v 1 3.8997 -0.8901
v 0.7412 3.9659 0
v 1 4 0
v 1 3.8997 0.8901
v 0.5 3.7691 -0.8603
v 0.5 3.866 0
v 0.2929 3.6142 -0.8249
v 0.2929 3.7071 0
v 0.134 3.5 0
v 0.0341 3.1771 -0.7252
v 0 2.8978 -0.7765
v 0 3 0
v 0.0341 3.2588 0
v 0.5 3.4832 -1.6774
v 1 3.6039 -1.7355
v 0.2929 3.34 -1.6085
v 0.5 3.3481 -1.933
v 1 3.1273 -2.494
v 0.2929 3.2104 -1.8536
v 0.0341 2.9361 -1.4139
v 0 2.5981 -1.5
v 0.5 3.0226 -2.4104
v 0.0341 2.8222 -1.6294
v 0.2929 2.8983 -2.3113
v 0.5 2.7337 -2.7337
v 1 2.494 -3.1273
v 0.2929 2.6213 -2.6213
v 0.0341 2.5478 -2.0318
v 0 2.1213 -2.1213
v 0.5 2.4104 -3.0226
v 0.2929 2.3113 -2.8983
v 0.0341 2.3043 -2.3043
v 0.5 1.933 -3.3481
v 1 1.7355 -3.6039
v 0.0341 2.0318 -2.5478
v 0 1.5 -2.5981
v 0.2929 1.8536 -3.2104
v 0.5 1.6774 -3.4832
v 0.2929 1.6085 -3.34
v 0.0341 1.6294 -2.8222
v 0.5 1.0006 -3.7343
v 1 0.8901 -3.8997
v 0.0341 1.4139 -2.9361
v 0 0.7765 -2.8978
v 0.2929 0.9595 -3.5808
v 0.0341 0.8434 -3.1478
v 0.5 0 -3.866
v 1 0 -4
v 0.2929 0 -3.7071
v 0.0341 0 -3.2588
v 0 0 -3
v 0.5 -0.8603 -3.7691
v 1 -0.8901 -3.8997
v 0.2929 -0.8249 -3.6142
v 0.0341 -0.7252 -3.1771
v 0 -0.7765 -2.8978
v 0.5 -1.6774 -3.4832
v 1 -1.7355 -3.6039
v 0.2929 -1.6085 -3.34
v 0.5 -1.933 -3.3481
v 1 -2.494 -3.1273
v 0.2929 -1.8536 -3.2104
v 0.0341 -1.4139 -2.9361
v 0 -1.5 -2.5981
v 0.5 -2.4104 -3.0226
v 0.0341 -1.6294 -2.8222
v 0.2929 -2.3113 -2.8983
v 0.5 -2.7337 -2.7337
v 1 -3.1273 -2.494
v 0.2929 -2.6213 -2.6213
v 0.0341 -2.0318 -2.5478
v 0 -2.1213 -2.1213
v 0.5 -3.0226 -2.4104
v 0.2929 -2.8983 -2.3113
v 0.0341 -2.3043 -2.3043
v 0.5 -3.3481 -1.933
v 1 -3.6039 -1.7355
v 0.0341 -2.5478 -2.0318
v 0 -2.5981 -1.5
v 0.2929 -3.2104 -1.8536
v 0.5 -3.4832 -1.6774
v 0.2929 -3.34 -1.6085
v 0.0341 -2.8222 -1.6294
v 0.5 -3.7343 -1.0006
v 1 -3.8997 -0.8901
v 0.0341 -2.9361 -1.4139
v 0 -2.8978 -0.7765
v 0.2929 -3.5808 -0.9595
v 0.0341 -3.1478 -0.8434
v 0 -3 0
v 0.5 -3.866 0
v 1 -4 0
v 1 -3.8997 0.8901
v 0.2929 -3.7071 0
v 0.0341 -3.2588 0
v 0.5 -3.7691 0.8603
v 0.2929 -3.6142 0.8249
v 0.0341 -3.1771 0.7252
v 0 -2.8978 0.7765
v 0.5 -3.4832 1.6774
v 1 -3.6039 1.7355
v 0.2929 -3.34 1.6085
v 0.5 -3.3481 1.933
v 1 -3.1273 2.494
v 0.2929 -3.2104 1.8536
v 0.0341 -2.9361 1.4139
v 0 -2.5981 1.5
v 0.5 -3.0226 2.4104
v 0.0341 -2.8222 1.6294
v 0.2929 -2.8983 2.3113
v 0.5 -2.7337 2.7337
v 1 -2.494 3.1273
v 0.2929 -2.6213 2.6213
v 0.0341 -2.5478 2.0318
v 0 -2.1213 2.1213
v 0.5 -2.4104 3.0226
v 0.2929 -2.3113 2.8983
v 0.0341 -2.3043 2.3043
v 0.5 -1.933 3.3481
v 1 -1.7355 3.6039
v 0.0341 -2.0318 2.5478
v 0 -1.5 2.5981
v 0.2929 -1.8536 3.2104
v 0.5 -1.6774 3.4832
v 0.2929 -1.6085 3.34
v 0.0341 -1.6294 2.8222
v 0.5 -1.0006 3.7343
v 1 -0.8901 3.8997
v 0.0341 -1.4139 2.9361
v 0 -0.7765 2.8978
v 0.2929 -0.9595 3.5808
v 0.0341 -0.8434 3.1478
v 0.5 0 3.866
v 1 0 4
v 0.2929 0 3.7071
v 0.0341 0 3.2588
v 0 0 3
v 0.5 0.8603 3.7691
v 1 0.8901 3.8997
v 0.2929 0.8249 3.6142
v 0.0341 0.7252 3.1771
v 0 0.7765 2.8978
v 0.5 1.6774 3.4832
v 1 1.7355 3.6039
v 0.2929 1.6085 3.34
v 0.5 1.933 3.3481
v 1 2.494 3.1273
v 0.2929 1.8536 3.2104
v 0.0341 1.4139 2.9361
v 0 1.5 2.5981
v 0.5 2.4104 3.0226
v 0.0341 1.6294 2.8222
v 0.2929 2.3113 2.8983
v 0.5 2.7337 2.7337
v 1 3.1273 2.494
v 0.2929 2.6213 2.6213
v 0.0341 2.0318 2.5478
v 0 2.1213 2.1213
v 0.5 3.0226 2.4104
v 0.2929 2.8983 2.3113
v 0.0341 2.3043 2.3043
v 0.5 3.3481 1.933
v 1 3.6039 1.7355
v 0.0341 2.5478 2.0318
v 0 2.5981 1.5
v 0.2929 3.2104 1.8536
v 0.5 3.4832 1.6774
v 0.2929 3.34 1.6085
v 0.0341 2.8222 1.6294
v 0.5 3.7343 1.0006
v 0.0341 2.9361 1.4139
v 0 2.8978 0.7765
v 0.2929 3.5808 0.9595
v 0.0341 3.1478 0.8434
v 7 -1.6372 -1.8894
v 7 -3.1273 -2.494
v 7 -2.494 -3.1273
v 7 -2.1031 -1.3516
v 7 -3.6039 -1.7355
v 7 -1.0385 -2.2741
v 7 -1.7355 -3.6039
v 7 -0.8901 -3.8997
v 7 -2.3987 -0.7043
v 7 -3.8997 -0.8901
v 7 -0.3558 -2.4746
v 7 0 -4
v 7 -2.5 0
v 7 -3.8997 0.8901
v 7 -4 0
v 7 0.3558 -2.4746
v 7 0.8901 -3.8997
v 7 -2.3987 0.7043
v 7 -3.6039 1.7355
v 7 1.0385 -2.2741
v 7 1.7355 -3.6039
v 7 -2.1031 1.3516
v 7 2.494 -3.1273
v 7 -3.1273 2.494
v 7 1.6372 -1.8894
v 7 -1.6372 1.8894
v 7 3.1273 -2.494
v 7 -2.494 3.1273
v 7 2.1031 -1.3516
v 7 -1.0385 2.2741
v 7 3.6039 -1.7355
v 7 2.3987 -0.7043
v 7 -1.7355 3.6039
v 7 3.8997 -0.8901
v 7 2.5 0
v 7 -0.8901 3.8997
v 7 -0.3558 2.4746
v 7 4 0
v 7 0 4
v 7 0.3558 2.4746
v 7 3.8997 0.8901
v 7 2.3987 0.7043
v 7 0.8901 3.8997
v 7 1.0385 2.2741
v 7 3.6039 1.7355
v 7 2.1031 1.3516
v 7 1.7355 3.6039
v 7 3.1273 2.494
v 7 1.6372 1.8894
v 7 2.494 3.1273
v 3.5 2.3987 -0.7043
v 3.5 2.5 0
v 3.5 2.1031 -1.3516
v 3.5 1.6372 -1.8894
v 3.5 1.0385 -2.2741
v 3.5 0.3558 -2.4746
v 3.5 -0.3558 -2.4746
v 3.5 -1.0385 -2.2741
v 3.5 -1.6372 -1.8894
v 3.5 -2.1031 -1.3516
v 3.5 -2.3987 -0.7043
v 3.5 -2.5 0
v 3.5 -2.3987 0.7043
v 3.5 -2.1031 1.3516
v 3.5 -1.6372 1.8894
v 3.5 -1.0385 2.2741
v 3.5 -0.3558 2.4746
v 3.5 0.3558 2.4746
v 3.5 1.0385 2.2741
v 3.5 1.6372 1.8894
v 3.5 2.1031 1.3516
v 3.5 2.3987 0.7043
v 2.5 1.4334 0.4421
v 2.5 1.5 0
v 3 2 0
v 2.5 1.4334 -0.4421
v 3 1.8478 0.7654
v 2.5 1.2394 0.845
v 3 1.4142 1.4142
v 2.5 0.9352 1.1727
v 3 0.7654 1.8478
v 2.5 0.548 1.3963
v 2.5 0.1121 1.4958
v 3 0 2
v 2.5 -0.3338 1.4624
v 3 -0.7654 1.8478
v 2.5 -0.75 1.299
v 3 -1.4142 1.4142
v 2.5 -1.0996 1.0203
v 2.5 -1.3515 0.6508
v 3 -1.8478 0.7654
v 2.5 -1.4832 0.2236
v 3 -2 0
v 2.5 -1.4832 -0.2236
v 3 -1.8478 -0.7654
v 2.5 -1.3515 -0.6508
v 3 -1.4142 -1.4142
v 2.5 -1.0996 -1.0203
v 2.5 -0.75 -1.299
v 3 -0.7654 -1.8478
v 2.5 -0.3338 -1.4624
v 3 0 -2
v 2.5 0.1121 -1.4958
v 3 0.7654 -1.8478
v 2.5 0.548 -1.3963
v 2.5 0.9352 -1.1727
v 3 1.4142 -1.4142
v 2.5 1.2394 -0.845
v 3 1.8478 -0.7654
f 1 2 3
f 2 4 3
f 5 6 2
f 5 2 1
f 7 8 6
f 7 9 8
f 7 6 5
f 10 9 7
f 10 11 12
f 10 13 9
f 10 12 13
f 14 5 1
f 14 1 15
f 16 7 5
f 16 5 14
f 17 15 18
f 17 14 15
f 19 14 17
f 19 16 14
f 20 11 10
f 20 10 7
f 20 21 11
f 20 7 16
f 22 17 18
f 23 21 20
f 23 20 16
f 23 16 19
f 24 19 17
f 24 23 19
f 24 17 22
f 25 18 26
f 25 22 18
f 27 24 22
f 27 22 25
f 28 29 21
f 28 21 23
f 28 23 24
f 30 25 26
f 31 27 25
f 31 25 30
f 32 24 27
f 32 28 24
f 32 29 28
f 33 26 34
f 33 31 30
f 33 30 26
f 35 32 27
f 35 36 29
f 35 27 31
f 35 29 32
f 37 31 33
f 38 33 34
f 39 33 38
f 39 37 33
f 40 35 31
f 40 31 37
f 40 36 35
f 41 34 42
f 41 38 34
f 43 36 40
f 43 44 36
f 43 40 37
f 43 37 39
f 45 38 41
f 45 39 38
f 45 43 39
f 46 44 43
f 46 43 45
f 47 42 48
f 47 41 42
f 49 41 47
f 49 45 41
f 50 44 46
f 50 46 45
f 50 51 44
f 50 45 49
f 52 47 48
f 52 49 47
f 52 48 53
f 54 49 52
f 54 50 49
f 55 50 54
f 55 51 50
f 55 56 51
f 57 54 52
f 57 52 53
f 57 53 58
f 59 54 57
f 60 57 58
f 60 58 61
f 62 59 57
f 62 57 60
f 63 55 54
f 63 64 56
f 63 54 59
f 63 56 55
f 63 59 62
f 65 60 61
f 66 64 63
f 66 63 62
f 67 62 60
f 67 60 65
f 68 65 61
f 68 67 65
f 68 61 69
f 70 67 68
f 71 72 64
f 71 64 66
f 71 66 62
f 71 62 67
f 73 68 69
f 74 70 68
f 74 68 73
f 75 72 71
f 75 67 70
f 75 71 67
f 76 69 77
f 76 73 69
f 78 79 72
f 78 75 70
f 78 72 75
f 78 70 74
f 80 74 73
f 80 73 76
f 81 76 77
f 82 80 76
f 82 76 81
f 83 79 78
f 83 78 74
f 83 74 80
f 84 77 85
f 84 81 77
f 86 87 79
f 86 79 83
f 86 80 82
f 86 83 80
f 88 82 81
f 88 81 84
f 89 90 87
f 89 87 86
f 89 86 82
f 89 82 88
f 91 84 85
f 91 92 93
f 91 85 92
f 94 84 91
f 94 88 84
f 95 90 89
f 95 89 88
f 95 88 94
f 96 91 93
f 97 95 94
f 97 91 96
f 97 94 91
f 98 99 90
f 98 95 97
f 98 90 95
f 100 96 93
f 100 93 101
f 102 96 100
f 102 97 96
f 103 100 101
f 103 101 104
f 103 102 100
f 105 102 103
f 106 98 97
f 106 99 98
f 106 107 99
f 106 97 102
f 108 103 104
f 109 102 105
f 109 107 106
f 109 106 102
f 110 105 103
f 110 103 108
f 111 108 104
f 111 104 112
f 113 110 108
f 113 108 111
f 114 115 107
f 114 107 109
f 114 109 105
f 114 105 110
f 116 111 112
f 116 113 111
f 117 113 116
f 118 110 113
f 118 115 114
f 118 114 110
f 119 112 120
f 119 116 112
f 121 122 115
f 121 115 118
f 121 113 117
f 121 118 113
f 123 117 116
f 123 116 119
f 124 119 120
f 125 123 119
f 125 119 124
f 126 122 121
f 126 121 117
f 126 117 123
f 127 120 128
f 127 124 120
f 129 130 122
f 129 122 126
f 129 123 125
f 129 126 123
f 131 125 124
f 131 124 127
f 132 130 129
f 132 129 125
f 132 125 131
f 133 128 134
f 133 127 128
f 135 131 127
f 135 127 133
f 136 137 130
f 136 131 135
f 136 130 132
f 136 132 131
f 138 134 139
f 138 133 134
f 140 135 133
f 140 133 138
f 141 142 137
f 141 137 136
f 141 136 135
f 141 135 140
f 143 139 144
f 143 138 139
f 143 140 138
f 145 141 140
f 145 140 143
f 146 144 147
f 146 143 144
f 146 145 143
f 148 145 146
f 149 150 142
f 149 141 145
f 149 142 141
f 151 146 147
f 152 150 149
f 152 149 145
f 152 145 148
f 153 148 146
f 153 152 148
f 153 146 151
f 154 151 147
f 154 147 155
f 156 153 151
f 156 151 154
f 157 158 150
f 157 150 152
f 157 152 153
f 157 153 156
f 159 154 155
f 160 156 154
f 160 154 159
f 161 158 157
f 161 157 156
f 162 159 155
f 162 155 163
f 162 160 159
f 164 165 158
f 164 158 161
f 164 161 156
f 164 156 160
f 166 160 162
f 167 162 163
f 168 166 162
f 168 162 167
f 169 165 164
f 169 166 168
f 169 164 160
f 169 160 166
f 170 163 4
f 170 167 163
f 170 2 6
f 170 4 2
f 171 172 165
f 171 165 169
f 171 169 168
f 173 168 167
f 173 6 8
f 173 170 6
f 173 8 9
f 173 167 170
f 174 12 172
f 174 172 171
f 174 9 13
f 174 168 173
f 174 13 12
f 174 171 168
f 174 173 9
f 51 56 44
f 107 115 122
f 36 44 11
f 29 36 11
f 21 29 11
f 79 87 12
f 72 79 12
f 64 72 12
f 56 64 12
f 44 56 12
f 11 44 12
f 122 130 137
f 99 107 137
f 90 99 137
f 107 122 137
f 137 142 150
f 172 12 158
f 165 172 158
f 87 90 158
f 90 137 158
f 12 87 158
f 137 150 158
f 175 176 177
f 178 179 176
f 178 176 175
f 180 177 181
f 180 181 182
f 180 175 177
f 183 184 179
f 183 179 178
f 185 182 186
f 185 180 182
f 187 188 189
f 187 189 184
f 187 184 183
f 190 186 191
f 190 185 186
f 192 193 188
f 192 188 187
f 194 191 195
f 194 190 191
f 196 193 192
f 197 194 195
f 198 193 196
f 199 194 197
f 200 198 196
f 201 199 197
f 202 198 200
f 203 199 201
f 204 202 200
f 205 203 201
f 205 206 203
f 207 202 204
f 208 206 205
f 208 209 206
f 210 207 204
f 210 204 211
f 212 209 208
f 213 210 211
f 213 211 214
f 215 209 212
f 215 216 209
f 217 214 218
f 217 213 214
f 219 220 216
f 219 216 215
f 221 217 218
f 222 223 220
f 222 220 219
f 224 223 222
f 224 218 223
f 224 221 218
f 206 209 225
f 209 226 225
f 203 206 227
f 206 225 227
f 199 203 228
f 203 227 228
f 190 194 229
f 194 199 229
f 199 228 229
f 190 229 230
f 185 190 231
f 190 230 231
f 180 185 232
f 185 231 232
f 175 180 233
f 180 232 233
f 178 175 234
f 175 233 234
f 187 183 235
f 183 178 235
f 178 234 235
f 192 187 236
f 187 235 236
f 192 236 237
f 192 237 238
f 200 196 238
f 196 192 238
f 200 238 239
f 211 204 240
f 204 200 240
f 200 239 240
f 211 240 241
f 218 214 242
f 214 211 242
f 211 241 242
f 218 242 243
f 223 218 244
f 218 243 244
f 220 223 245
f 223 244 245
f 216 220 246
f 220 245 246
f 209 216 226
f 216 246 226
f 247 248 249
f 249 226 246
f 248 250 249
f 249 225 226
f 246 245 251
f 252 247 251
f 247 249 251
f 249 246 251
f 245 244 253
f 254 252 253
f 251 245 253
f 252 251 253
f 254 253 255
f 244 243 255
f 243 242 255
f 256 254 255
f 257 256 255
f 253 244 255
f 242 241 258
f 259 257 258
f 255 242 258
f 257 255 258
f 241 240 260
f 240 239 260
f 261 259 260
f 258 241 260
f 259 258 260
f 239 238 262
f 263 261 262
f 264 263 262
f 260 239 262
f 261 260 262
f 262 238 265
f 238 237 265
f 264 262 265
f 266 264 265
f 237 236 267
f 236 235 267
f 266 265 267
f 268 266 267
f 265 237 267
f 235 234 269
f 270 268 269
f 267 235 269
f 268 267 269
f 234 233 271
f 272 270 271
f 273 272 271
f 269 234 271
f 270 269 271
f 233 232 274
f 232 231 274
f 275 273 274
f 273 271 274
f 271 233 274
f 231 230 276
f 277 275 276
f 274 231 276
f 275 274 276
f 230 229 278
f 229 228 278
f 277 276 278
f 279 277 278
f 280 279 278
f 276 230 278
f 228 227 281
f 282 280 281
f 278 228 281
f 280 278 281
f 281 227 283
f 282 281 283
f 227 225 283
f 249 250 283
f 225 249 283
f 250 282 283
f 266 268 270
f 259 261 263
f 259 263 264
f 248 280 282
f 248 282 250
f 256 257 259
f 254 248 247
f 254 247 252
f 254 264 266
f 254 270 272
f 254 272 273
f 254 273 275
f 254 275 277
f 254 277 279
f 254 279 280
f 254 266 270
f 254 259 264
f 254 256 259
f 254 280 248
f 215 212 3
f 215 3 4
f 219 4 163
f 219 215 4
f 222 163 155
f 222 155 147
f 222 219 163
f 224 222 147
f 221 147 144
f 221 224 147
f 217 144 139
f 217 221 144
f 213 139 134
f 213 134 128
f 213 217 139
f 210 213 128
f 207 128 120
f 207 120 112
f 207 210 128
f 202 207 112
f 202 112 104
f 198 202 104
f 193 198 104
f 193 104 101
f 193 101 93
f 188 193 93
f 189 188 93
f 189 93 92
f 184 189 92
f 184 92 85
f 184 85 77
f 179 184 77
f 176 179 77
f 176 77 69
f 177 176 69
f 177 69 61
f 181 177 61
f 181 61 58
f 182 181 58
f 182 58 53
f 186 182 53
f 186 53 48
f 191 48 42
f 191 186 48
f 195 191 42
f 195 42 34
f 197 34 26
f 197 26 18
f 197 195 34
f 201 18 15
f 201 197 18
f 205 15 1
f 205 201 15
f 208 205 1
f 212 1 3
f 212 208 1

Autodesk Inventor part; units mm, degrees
sketch "Sketch_1" plane through (0, 0, 0) normal (0, 0, 1) x (1, 0, 0)
  line L0 (12, 0) -> (0, 0)
  line L1 (0, 0) -> (0, 3)
  arc A0 (1, 4) -> (0, 3) centre (1, 3) ccw
  line L2 (1, 4) -> (7, 4)
  line L3 (7, 4) -> (7, 2.5)
  line L4 (7, 2.5) -> (3.5, 2.5)
  line L5 (3.5, 2.5) -> (2.5, 1.5)
  line L6 (2.5, 1.5) -> (2.5, 0)
  line L7 (2.5, 0) -> (0, 0)
revolve "Revolution1" add sketch "Sketch_1" angle 360 about axis through (12, 0, 0) along (1, 0, 0)
ref_plane "pusher_XY" through (7, 0, 0) normal (1, 0, 0) x (0, 0, -1)
ref_plane "pusher_YZ" through (7, 0, 0) normal (0, 0, -1) x (0, 1, 0)
ref_plane "pusher_ZX" through (7, 0, 0) normal (0, 1, 0) x (1, 0, 0)
properties part number "URLM8_p"
